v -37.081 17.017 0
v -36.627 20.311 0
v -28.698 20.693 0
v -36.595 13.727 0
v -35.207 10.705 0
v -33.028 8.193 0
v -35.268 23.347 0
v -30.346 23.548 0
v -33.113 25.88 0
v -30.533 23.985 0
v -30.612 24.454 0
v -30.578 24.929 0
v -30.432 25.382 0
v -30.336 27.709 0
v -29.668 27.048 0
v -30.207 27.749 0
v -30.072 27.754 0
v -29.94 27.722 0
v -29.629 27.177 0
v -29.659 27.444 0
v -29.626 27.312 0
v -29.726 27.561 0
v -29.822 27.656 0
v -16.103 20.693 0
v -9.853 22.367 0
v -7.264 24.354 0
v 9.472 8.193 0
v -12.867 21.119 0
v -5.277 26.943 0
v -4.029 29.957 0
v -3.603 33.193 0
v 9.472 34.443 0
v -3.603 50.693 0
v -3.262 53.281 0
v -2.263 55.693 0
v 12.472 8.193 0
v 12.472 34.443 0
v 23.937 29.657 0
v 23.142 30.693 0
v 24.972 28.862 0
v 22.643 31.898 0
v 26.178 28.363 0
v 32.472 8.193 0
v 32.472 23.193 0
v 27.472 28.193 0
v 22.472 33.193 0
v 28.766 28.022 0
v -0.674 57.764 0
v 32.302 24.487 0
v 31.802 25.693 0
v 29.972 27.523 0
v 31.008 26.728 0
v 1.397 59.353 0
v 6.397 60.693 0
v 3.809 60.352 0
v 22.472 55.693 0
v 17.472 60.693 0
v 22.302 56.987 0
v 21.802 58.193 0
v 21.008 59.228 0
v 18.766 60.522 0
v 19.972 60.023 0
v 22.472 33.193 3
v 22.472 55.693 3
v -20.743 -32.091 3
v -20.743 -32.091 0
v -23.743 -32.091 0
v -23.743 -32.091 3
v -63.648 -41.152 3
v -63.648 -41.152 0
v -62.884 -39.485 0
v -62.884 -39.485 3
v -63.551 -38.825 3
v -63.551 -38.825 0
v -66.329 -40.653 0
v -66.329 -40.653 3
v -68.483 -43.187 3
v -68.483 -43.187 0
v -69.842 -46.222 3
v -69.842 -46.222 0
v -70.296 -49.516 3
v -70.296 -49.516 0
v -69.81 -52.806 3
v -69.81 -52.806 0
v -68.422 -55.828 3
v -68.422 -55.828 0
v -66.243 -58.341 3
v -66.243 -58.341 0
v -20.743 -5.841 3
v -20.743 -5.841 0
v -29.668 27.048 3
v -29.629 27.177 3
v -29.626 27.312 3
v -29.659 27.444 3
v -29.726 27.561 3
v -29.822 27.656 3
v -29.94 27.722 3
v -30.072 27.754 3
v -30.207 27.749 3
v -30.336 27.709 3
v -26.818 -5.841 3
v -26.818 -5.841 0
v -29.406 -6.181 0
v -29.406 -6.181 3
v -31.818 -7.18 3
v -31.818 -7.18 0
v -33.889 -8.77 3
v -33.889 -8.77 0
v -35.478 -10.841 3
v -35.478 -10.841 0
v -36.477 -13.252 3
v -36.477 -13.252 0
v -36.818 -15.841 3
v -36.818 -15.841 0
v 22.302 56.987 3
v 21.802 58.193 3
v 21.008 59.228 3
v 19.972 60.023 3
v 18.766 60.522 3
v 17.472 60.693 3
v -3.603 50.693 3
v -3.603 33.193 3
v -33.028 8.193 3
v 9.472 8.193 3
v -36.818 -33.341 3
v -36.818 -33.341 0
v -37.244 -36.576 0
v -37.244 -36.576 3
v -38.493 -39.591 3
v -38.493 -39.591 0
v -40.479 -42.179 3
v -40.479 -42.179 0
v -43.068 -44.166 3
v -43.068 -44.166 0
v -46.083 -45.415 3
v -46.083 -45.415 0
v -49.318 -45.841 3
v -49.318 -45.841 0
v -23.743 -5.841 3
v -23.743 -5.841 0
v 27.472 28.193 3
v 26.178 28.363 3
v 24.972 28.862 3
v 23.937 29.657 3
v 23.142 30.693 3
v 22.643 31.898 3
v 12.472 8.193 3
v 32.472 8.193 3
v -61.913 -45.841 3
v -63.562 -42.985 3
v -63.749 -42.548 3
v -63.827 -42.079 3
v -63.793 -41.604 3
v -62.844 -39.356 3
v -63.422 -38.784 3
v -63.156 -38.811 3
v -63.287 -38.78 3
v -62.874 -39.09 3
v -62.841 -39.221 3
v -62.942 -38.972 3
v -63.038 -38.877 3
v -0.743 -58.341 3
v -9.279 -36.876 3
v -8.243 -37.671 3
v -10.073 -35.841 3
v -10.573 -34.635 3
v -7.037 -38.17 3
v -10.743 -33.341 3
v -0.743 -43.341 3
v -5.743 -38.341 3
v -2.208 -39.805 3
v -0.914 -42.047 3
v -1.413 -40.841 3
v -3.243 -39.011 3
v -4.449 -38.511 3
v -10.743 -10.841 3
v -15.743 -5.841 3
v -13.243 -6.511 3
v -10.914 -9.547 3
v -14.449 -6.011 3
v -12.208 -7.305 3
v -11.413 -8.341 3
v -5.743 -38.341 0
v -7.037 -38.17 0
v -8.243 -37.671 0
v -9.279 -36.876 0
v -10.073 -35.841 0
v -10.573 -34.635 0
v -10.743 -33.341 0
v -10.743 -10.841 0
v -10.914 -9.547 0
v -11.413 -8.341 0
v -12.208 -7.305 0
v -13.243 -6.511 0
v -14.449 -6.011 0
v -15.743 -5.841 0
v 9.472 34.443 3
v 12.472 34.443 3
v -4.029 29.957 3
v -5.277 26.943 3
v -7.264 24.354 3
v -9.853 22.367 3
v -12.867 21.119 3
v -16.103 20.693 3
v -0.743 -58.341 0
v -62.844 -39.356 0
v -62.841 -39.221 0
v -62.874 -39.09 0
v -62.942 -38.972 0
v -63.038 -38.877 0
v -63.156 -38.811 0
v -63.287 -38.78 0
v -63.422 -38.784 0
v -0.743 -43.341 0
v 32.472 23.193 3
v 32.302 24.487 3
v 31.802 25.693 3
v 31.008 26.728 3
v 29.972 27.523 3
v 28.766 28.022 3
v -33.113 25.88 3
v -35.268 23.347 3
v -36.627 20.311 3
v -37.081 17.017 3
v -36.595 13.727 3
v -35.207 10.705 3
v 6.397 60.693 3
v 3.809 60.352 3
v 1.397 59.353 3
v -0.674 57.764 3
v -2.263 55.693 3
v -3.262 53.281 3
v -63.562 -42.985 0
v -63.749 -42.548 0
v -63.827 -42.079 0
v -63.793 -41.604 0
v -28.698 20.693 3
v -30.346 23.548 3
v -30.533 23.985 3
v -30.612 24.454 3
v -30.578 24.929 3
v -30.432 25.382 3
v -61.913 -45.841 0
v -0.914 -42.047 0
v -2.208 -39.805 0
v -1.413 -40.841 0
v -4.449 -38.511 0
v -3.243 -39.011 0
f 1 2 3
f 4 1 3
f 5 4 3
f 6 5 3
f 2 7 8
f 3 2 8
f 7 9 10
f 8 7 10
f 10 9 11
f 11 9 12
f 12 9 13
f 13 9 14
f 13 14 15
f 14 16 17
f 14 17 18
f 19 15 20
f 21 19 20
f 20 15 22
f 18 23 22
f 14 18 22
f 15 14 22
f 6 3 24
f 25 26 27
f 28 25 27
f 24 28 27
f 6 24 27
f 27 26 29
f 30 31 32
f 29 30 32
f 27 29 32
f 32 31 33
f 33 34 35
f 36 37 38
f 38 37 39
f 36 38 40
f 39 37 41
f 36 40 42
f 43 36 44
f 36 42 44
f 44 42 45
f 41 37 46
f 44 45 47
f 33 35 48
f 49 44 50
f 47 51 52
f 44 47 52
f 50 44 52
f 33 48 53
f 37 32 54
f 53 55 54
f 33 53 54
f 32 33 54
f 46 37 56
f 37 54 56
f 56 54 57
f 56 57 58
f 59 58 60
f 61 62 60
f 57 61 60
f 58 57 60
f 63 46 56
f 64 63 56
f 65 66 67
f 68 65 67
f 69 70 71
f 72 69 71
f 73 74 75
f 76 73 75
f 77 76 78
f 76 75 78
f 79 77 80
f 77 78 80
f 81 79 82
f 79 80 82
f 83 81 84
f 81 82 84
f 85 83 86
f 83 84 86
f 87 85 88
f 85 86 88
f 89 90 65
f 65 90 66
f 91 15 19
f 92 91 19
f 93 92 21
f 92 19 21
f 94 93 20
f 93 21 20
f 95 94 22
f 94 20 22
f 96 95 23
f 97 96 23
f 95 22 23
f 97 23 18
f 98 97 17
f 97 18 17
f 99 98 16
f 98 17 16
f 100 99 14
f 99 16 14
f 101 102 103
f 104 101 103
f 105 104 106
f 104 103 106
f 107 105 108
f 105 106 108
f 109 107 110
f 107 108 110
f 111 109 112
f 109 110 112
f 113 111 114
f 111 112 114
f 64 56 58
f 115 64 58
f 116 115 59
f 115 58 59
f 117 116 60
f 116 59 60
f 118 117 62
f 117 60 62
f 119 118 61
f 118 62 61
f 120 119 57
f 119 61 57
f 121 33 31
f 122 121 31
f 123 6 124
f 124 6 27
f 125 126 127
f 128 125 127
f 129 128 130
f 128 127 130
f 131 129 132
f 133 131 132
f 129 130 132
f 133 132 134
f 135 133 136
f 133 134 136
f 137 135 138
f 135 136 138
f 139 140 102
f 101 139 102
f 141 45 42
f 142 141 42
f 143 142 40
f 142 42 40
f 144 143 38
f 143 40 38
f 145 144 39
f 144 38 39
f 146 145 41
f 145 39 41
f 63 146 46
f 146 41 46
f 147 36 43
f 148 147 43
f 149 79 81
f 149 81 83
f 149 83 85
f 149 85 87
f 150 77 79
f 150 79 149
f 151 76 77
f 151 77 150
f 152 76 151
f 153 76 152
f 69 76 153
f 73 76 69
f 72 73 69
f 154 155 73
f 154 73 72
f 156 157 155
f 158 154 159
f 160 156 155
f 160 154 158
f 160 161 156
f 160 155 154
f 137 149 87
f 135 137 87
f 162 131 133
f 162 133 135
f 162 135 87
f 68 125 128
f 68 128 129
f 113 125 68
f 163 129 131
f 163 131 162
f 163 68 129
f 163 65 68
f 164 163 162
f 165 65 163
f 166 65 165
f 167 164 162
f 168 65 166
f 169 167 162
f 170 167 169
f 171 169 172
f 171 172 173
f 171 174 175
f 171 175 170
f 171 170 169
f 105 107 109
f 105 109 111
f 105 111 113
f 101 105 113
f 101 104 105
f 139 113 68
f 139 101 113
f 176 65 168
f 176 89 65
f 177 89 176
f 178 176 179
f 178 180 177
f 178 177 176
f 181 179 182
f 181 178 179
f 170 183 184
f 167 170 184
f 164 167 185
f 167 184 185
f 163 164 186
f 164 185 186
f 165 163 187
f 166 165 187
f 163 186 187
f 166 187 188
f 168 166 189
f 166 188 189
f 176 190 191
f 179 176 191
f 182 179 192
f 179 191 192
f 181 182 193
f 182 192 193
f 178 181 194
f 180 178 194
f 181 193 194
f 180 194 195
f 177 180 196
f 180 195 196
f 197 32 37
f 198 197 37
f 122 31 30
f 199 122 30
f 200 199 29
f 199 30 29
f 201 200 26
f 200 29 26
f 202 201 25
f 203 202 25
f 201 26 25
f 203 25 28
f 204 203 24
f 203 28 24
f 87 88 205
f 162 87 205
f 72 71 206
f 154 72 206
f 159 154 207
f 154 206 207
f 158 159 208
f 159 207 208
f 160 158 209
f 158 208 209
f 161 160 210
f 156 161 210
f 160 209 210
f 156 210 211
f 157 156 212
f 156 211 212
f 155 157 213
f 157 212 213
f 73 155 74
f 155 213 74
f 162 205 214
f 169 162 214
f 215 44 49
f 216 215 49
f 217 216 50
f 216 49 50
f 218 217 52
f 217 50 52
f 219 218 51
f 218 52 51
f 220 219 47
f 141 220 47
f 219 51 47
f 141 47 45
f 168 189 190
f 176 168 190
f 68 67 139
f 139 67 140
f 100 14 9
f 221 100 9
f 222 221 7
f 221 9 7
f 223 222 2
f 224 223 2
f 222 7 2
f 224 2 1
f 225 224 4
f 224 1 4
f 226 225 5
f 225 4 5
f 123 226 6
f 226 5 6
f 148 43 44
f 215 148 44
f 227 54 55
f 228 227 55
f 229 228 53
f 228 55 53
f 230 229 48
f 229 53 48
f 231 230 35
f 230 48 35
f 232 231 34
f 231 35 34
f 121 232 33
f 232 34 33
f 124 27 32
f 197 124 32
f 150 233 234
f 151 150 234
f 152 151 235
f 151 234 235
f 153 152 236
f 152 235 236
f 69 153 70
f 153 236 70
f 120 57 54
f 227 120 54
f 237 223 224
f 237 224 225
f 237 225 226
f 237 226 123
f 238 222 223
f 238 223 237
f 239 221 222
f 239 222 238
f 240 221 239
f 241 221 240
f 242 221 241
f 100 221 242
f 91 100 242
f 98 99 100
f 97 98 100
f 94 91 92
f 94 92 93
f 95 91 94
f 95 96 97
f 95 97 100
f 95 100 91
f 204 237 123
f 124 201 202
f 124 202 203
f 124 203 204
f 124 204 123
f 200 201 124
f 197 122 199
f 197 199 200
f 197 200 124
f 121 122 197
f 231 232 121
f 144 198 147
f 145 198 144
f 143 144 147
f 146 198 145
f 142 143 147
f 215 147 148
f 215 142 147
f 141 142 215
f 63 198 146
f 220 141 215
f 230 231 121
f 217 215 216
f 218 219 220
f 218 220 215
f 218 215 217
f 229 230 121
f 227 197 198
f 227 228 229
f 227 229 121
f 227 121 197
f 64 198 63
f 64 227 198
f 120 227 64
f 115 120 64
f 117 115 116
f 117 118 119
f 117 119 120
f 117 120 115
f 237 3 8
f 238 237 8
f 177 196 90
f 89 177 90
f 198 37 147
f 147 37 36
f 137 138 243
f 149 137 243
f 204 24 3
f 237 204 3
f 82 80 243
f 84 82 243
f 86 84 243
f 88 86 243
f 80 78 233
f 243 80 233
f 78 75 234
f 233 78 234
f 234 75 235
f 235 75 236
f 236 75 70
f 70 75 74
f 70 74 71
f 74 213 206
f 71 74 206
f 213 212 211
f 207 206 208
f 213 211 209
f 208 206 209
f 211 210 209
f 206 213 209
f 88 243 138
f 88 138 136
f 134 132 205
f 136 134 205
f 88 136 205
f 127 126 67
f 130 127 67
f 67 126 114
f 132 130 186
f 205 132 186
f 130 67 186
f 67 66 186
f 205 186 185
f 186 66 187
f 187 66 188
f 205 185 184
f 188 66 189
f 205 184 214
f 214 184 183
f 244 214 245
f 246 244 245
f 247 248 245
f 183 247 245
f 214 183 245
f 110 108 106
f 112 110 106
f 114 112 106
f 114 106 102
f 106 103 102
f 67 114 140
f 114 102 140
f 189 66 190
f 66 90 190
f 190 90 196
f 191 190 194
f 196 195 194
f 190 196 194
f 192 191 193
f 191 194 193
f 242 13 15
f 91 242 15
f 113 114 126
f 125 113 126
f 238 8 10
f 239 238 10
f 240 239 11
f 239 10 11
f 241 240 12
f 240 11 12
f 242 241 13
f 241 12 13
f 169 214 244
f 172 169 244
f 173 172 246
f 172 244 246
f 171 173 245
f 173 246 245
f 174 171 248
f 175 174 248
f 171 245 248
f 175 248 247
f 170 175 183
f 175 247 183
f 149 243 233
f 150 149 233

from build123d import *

# Parameters (mm, degrees)
F1_DEPTH = 3


with BuildPart() as f1:
    # F0 (on Top) → F1 (new body)
    with BuildSketch(Plane.XY):
        with BuildLine():
            ThreePointArc((-3.602714, 33.192595), (-7.263879, 24.35376), (-16.102714, 20.692595))
            Line((-16.102714, 20.692595), (-28.69764, 20.692595))
            Line((-28.69764, 20.692595), (-30.346209, 23.548001))
            ThreePointArc((-30.346209, 23.548001), (-30.611964, 24.454349), (-30.432163, 25.381584))
            Line((-30.432163, 25.381584), (-29.668132, 27.0479))
            ThreePointArc((-29.668132, 27.0479), (-29.770924, 27.611684), (-30.335748, 27.708603))
            ThreePointArc((-30.335748, 27.708603), (-36.970856, 18.680172), (-33.027767, 8.192595))
            Line((-33.027767, 8.192595), (9.472233, 8.192595))
            Line((9.472233, 8.192595), (9.472233, 34.442595))
            Line((9.472233, 34.442595), (12.472233, 34.442595))
            Line((12.472233, 34.442595), (12.472233, 8.192595))
            Line((12.472233, 8.192595), (32.472233, 8.192595))
            Line((32.472233, 8.192595), (32.472233, 23.192595))
            ThreePointArc((32.472233, 23.192595), (31.007767, 26.728129), (27.472233, 28.192595))
            ThreePointArc((27.472233, 28.192595), (23.9367, 29.657061), (22.472233, 33.192595))
            Line((22.472233, 33.192595), (22.472233, 55.692595))
            ThreePointArc((22.472233, 55.692595), (21.007767, 59.228129), (17.472233, 60.692595))
            Line((17.472233, 60.692595), (6.397286, 60.692595))
            ThreePointArc((6.397286, 60.692595), (-0.673782, 57.763663), (-3.602714, 50.692595))
            Line((-3.602714, 50.692595), (-3.602714, 33.192595))
        make_face()
        with BuildLine():
            ThreePointArc((-36.818155, -33.340631), (-40.47932, -42.179466), (-49.318155, -45.840631))
            Line((-49.318155, -45.840631), (-61.913081, -45.840631))
            Line((-61.913081, -45.840631), (-63.561651, -42.985225))
            ThreePointArc((-63.561651, -42.985225), (-63.827406, -42.078877), (-63.647604, -41.151643))
            Line((-63.647604, -41.151643), (-62.883573, -39.485326))
            ThreePointArc((-62.883573, -39.485326), (-62.986366, -38.921542), (-63.551189, -38.824623))
            ThreePointArc((-63.551189, -38.824623), (-70.186298, -47.853054), (-66.243208, -58.340631))
            Line((-66.243208, -58.340631), (-23.743208, -58.340631))
            Line((-23.743208, -58.340631), (-20.743208, -58.340631))
            Line((-20.743208, -58.340631), (-0.743208, -58.340631))
            Line((-0.743208, -58.340631), (-0.743208, -43.340631))
            ThreePointArc((-0.743208, -43.340631), (-2.207674, -39.805097), (-5.743208, -38.340631))
            ThreePointArc((-5.743208, -38.340631), (-9.278742, -36.876165), (-10.743208, -33.340631))
            Line((-10.743208, -33.340631), (-10.743208, -10.840631))
            ThreePointArc((-10.743208, -10.840631), (-12.207674, -7.305097), (-15.743208, -5.840631))
            Line((-15.743208, -5.840631), (-20.743208, -5.840631))
            Line((-20.743208, -5.840631), (-20.743208, -32.090631))
            Line((-20.743208, -32.090631), (-23.743208, -32.090631))
            Line((-23.743208, -32.090631), (-23.743208, -5.840631))
            Line((-23.743208, -5.840631), (-26.818155, -5.840631))
            ThreePointArc((-26.818155, -5.840631), (-33.889223, -8.769563), (-36.818155, -15.840631))
            Line((-36.818155, -15.840631), (-36.818155, -33.340631))
        make_face()
    extrude(amount=F1_DEPTH)


solid = f1.part
